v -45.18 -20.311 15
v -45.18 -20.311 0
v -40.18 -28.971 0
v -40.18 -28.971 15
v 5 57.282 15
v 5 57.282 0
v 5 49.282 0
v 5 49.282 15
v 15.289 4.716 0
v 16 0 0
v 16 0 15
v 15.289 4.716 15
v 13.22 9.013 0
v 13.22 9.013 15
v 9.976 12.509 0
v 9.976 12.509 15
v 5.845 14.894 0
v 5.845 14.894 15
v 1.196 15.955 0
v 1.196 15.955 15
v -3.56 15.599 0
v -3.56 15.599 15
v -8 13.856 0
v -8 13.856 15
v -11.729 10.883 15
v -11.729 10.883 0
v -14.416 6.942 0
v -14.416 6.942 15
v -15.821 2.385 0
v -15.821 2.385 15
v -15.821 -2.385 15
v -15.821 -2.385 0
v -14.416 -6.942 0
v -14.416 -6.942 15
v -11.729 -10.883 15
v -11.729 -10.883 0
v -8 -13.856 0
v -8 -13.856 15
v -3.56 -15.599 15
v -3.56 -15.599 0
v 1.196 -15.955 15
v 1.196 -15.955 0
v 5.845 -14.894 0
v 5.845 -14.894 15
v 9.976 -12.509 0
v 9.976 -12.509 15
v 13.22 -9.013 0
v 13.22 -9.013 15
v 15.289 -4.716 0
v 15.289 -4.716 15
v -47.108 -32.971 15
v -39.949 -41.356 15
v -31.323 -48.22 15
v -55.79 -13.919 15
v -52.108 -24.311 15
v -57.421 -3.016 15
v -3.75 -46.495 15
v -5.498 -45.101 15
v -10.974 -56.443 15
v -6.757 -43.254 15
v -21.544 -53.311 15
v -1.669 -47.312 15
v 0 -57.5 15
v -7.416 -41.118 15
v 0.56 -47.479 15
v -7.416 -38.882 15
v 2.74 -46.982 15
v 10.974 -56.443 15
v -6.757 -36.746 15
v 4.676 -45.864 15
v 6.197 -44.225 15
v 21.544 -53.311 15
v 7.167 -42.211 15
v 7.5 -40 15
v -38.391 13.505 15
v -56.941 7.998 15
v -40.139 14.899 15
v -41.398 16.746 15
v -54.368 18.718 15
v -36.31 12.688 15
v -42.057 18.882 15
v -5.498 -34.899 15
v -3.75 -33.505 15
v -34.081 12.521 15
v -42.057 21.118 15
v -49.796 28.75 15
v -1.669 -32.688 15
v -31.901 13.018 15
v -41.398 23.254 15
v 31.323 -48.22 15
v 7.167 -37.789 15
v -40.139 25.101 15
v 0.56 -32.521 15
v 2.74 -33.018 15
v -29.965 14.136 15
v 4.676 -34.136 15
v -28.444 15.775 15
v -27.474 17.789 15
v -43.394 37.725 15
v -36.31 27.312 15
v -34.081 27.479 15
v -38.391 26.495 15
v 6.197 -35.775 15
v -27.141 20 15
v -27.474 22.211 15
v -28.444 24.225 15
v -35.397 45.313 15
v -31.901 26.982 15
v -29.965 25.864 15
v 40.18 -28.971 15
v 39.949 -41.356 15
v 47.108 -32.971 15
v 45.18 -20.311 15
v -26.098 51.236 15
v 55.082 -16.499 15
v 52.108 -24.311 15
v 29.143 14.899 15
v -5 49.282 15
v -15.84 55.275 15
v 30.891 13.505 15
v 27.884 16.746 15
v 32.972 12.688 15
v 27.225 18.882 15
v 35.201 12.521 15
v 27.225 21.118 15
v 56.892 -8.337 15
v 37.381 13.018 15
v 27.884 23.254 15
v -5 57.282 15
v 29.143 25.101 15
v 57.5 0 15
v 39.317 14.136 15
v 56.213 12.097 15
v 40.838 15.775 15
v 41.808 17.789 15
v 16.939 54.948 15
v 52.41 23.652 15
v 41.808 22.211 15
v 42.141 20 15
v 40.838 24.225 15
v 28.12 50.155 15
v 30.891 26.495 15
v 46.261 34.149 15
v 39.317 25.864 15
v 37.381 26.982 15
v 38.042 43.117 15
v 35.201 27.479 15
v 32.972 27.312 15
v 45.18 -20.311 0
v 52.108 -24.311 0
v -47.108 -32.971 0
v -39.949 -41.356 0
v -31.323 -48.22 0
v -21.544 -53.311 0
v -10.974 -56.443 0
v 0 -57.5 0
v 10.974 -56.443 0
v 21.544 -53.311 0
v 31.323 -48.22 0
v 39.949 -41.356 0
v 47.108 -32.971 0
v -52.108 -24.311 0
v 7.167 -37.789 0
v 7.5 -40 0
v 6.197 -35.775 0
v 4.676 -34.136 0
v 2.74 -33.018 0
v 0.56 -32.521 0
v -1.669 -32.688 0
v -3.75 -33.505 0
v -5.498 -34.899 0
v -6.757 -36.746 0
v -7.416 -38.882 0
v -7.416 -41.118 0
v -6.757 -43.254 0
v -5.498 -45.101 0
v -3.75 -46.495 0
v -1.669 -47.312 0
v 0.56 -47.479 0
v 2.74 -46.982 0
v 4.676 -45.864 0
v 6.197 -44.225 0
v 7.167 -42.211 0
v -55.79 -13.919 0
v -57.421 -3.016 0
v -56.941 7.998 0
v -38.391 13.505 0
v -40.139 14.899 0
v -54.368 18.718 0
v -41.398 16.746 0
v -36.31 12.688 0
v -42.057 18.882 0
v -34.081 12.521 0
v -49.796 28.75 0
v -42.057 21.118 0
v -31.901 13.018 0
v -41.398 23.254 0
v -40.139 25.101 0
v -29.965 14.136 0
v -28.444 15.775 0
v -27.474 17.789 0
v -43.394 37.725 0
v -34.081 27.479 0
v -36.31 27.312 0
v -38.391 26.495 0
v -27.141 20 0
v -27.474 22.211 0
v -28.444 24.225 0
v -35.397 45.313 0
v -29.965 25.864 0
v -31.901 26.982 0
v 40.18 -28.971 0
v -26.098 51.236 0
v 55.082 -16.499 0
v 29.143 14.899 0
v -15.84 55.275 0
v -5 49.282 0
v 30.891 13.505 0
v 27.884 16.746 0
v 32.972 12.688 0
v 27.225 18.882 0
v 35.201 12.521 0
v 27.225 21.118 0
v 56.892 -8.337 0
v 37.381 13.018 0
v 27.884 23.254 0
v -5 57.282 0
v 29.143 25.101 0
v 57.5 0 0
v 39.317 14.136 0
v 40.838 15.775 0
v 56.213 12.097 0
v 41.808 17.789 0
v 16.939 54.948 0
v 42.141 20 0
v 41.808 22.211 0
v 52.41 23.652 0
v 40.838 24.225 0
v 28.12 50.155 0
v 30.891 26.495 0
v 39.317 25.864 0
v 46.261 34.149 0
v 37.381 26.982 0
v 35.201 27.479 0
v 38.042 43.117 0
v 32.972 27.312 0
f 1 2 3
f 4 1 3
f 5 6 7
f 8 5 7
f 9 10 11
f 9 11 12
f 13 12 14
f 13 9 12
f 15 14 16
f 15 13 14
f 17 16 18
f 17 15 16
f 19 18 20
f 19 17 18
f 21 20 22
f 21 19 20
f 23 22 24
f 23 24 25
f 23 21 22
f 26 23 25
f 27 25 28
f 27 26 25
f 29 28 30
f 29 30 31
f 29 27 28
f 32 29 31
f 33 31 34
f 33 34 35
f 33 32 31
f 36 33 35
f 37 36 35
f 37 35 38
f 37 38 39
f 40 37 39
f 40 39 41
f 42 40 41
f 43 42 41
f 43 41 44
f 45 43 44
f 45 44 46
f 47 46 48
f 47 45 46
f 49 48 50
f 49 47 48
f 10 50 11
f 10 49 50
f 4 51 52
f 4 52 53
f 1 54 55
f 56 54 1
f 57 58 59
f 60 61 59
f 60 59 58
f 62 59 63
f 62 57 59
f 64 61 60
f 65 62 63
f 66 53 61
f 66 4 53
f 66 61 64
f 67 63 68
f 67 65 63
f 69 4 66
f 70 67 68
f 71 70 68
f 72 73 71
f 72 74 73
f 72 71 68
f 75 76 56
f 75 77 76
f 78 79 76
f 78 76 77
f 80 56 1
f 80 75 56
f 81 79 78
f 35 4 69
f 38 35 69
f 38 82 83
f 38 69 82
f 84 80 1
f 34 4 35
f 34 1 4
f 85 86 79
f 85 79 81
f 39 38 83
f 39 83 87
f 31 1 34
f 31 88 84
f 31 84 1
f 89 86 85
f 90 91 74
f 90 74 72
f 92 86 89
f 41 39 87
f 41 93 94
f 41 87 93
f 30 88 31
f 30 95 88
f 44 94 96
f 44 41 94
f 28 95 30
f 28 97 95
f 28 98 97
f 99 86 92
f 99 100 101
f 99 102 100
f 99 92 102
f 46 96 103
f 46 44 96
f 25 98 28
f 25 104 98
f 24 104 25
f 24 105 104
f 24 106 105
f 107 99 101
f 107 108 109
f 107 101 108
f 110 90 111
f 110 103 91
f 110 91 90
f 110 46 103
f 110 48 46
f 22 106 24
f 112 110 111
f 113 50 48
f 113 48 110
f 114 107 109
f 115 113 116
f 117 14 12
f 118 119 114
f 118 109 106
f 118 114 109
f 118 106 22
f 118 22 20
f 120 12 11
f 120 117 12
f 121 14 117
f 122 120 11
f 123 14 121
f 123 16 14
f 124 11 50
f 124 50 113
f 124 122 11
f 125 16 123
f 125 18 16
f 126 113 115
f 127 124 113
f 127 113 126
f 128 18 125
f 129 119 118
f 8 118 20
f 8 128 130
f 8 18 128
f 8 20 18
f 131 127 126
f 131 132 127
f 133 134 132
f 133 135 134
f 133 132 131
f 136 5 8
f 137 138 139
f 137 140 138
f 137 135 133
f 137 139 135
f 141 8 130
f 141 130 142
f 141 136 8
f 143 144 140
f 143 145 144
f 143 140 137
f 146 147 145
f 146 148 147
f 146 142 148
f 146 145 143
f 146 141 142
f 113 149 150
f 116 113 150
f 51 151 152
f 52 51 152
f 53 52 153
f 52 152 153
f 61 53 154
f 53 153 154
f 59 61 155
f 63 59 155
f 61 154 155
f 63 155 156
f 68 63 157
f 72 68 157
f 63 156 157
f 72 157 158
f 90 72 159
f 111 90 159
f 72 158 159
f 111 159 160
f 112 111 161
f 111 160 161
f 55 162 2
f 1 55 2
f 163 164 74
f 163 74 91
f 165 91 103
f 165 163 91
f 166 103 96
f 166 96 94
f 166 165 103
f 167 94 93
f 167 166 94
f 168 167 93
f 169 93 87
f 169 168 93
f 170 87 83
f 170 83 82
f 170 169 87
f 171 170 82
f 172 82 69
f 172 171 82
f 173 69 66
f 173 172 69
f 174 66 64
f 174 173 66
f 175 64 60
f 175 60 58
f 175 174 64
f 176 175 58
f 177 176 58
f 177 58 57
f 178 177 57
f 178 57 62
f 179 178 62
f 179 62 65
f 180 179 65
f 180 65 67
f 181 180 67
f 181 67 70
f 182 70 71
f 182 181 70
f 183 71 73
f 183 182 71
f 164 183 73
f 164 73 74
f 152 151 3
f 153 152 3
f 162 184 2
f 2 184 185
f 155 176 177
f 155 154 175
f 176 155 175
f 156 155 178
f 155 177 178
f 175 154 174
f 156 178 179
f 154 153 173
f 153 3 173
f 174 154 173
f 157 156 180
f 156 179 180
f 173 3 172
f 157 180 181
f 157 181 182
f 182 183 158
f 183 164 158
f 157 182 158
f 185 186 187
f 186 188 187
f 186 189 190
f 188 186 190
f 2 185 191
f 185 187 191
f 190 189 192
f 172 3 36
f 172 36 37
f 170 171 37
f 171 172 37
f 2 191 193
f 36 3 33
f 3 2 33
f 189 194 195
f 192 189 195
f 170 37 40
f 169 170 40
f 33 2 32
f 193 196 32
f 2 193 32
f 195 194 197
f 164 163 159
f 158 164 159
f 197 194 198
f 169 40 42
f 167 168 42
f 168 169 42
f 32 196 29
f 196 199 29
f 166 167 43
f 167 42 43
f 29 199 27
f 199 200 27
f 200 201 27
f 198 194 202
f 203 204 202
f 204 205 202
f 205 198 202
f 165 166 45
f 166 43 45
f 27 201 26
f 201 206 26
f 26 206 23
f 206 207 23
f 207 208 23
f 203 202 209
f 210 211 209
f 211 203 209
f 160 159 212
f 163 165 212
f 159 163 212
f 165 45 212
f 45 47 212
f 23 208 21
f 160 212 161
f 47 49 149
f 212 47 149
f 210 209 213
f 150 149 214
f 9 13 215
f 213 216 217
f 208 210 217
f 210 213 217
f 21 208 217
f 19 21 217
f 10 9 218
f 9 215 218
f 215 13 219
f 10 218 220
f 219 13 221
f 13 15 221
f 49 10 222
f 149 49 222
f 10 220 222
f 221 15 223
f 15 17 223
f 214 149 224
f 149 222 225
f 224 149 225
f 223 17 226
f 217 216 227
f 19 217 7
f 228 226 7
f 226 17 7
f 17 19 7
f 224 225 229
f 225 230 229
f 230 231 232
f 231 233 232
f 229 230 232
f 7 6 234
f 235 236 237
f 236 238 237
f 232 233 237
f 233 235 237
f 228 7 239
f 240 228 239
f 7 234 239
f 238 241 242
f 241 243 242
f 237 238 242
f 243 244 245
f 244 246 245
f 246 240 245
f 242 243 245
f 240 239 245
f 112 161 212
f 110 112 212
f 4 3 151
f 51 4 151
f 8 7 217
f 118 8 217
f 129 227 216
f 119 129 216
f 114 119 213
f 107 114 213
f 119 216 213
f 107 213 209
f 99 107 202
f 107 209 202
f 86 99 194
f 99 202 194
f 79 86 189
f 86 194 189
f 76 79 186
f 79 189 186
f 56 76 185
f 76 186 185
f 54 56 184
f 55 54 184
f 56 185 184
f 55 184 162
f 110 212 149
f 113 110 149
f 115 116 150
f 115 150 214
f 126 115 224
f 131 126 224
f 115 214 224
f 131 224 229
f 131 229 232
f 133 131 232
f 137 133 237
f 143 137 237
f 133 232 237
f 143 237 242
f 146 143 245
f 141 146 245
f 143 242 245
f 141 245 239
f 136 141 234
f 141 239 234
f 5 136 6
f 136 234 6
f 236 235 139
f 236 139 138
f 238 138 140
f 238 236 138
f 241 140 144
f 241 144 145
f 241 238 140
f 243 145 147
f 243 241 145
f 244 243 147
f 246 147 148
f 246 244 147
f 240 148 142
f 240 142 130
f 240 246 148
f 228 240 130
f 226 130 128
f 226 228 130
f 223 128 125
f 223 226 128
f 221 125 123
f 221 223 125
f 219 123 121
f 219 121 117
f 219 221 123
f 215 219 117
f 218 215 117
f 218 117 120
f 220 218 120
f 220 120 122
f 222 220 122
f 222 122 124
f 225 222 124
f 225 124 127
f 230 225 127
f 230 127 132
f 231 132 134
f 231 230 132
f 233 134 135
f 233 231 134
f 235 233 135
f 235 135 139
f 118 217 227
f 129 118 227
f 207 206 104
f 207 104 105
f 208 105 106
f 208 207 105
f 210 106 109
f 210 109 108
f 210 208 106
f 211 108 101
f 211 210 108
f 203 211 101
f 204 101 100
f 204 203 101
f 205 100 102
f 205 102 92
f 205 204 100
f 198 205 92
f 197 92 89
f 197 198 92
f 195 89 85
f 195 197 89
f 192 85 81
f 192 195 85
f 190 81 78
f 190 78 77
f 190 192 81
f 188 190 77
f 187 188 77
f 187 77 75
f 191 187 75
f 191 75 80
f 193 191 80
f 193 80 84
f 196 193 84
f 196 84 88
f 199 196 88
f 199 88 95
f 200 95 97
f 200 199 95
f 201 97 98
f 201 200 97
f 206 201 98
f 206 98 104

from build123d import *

# Parameters (mm, degrees)
SKETCH1_R           = 7.5
SKETCH1_R_2         = 16
BOSS_EXTRUDE1_DEPTH = 15


with BuildPart() as part:
    # Sketch1 → Boss-Extrude1 (new body)
    with BuildSketch(Plane.XY):
        with BuildLine():
            Line((5, 49.282196187), (-5, 49.282196187))
            Line((-5, 49.282196187), (-5, 57.282196187))
            ThreePointArc((-5, 57.282196187), (-49.796460718, 28.75), (-52.107837082, -24.310971075))
            Line((-52.107837082, -24.310971075), (-45.179633852, -20.310971075))
            Line((-45.179633852, -20.310971075), (-40.179633852, -28.971225112))
            Line((-40.179633852, -28.971225112), (-47.107837082, -32.971225112))
            ThreePointArc((-47.107837082, -32.971225112), (0, -57.5), (47.107837082, -32.971225112))
            Line((47.107837082, -32.971225112), (40.179633852, -28.971225112))
            Line((40.179633852, -28.971225112), (45.179633852, -20.310971075))
            Line((45.179633852, -20.310971075), (52.107837082, -24.310971075))
            ThreePointArc((52.107837082, -24.310971075), (56.135775724, -12.450890887), (57.5, 0))
            ThreePointArc((57.5, 0), (42.389562395, 38.85067567), (5, 57.282196187))
            Line((5, 57.282196187), (5, 49.282196187))
        make_face()
        with Locations((0, -40)):
            Circle(SKETCH1_R, mode=Mode.SUBTRACT)
        with Locations((-34.641016151, 20)):
            Circle(SKETCH1_R, mode=Mode.SUBTRACT)
        Circle(SKETCH1_R_2, mode=Mode.SUBTRACT)
        with Locations((34.641016151, 20)):
            Circle(SKETCH1_R, mode=Mode.SUBTRACT)
    extrude(amount=BOSS_EXTRUDE1_DEPTH)


solid = part.part
